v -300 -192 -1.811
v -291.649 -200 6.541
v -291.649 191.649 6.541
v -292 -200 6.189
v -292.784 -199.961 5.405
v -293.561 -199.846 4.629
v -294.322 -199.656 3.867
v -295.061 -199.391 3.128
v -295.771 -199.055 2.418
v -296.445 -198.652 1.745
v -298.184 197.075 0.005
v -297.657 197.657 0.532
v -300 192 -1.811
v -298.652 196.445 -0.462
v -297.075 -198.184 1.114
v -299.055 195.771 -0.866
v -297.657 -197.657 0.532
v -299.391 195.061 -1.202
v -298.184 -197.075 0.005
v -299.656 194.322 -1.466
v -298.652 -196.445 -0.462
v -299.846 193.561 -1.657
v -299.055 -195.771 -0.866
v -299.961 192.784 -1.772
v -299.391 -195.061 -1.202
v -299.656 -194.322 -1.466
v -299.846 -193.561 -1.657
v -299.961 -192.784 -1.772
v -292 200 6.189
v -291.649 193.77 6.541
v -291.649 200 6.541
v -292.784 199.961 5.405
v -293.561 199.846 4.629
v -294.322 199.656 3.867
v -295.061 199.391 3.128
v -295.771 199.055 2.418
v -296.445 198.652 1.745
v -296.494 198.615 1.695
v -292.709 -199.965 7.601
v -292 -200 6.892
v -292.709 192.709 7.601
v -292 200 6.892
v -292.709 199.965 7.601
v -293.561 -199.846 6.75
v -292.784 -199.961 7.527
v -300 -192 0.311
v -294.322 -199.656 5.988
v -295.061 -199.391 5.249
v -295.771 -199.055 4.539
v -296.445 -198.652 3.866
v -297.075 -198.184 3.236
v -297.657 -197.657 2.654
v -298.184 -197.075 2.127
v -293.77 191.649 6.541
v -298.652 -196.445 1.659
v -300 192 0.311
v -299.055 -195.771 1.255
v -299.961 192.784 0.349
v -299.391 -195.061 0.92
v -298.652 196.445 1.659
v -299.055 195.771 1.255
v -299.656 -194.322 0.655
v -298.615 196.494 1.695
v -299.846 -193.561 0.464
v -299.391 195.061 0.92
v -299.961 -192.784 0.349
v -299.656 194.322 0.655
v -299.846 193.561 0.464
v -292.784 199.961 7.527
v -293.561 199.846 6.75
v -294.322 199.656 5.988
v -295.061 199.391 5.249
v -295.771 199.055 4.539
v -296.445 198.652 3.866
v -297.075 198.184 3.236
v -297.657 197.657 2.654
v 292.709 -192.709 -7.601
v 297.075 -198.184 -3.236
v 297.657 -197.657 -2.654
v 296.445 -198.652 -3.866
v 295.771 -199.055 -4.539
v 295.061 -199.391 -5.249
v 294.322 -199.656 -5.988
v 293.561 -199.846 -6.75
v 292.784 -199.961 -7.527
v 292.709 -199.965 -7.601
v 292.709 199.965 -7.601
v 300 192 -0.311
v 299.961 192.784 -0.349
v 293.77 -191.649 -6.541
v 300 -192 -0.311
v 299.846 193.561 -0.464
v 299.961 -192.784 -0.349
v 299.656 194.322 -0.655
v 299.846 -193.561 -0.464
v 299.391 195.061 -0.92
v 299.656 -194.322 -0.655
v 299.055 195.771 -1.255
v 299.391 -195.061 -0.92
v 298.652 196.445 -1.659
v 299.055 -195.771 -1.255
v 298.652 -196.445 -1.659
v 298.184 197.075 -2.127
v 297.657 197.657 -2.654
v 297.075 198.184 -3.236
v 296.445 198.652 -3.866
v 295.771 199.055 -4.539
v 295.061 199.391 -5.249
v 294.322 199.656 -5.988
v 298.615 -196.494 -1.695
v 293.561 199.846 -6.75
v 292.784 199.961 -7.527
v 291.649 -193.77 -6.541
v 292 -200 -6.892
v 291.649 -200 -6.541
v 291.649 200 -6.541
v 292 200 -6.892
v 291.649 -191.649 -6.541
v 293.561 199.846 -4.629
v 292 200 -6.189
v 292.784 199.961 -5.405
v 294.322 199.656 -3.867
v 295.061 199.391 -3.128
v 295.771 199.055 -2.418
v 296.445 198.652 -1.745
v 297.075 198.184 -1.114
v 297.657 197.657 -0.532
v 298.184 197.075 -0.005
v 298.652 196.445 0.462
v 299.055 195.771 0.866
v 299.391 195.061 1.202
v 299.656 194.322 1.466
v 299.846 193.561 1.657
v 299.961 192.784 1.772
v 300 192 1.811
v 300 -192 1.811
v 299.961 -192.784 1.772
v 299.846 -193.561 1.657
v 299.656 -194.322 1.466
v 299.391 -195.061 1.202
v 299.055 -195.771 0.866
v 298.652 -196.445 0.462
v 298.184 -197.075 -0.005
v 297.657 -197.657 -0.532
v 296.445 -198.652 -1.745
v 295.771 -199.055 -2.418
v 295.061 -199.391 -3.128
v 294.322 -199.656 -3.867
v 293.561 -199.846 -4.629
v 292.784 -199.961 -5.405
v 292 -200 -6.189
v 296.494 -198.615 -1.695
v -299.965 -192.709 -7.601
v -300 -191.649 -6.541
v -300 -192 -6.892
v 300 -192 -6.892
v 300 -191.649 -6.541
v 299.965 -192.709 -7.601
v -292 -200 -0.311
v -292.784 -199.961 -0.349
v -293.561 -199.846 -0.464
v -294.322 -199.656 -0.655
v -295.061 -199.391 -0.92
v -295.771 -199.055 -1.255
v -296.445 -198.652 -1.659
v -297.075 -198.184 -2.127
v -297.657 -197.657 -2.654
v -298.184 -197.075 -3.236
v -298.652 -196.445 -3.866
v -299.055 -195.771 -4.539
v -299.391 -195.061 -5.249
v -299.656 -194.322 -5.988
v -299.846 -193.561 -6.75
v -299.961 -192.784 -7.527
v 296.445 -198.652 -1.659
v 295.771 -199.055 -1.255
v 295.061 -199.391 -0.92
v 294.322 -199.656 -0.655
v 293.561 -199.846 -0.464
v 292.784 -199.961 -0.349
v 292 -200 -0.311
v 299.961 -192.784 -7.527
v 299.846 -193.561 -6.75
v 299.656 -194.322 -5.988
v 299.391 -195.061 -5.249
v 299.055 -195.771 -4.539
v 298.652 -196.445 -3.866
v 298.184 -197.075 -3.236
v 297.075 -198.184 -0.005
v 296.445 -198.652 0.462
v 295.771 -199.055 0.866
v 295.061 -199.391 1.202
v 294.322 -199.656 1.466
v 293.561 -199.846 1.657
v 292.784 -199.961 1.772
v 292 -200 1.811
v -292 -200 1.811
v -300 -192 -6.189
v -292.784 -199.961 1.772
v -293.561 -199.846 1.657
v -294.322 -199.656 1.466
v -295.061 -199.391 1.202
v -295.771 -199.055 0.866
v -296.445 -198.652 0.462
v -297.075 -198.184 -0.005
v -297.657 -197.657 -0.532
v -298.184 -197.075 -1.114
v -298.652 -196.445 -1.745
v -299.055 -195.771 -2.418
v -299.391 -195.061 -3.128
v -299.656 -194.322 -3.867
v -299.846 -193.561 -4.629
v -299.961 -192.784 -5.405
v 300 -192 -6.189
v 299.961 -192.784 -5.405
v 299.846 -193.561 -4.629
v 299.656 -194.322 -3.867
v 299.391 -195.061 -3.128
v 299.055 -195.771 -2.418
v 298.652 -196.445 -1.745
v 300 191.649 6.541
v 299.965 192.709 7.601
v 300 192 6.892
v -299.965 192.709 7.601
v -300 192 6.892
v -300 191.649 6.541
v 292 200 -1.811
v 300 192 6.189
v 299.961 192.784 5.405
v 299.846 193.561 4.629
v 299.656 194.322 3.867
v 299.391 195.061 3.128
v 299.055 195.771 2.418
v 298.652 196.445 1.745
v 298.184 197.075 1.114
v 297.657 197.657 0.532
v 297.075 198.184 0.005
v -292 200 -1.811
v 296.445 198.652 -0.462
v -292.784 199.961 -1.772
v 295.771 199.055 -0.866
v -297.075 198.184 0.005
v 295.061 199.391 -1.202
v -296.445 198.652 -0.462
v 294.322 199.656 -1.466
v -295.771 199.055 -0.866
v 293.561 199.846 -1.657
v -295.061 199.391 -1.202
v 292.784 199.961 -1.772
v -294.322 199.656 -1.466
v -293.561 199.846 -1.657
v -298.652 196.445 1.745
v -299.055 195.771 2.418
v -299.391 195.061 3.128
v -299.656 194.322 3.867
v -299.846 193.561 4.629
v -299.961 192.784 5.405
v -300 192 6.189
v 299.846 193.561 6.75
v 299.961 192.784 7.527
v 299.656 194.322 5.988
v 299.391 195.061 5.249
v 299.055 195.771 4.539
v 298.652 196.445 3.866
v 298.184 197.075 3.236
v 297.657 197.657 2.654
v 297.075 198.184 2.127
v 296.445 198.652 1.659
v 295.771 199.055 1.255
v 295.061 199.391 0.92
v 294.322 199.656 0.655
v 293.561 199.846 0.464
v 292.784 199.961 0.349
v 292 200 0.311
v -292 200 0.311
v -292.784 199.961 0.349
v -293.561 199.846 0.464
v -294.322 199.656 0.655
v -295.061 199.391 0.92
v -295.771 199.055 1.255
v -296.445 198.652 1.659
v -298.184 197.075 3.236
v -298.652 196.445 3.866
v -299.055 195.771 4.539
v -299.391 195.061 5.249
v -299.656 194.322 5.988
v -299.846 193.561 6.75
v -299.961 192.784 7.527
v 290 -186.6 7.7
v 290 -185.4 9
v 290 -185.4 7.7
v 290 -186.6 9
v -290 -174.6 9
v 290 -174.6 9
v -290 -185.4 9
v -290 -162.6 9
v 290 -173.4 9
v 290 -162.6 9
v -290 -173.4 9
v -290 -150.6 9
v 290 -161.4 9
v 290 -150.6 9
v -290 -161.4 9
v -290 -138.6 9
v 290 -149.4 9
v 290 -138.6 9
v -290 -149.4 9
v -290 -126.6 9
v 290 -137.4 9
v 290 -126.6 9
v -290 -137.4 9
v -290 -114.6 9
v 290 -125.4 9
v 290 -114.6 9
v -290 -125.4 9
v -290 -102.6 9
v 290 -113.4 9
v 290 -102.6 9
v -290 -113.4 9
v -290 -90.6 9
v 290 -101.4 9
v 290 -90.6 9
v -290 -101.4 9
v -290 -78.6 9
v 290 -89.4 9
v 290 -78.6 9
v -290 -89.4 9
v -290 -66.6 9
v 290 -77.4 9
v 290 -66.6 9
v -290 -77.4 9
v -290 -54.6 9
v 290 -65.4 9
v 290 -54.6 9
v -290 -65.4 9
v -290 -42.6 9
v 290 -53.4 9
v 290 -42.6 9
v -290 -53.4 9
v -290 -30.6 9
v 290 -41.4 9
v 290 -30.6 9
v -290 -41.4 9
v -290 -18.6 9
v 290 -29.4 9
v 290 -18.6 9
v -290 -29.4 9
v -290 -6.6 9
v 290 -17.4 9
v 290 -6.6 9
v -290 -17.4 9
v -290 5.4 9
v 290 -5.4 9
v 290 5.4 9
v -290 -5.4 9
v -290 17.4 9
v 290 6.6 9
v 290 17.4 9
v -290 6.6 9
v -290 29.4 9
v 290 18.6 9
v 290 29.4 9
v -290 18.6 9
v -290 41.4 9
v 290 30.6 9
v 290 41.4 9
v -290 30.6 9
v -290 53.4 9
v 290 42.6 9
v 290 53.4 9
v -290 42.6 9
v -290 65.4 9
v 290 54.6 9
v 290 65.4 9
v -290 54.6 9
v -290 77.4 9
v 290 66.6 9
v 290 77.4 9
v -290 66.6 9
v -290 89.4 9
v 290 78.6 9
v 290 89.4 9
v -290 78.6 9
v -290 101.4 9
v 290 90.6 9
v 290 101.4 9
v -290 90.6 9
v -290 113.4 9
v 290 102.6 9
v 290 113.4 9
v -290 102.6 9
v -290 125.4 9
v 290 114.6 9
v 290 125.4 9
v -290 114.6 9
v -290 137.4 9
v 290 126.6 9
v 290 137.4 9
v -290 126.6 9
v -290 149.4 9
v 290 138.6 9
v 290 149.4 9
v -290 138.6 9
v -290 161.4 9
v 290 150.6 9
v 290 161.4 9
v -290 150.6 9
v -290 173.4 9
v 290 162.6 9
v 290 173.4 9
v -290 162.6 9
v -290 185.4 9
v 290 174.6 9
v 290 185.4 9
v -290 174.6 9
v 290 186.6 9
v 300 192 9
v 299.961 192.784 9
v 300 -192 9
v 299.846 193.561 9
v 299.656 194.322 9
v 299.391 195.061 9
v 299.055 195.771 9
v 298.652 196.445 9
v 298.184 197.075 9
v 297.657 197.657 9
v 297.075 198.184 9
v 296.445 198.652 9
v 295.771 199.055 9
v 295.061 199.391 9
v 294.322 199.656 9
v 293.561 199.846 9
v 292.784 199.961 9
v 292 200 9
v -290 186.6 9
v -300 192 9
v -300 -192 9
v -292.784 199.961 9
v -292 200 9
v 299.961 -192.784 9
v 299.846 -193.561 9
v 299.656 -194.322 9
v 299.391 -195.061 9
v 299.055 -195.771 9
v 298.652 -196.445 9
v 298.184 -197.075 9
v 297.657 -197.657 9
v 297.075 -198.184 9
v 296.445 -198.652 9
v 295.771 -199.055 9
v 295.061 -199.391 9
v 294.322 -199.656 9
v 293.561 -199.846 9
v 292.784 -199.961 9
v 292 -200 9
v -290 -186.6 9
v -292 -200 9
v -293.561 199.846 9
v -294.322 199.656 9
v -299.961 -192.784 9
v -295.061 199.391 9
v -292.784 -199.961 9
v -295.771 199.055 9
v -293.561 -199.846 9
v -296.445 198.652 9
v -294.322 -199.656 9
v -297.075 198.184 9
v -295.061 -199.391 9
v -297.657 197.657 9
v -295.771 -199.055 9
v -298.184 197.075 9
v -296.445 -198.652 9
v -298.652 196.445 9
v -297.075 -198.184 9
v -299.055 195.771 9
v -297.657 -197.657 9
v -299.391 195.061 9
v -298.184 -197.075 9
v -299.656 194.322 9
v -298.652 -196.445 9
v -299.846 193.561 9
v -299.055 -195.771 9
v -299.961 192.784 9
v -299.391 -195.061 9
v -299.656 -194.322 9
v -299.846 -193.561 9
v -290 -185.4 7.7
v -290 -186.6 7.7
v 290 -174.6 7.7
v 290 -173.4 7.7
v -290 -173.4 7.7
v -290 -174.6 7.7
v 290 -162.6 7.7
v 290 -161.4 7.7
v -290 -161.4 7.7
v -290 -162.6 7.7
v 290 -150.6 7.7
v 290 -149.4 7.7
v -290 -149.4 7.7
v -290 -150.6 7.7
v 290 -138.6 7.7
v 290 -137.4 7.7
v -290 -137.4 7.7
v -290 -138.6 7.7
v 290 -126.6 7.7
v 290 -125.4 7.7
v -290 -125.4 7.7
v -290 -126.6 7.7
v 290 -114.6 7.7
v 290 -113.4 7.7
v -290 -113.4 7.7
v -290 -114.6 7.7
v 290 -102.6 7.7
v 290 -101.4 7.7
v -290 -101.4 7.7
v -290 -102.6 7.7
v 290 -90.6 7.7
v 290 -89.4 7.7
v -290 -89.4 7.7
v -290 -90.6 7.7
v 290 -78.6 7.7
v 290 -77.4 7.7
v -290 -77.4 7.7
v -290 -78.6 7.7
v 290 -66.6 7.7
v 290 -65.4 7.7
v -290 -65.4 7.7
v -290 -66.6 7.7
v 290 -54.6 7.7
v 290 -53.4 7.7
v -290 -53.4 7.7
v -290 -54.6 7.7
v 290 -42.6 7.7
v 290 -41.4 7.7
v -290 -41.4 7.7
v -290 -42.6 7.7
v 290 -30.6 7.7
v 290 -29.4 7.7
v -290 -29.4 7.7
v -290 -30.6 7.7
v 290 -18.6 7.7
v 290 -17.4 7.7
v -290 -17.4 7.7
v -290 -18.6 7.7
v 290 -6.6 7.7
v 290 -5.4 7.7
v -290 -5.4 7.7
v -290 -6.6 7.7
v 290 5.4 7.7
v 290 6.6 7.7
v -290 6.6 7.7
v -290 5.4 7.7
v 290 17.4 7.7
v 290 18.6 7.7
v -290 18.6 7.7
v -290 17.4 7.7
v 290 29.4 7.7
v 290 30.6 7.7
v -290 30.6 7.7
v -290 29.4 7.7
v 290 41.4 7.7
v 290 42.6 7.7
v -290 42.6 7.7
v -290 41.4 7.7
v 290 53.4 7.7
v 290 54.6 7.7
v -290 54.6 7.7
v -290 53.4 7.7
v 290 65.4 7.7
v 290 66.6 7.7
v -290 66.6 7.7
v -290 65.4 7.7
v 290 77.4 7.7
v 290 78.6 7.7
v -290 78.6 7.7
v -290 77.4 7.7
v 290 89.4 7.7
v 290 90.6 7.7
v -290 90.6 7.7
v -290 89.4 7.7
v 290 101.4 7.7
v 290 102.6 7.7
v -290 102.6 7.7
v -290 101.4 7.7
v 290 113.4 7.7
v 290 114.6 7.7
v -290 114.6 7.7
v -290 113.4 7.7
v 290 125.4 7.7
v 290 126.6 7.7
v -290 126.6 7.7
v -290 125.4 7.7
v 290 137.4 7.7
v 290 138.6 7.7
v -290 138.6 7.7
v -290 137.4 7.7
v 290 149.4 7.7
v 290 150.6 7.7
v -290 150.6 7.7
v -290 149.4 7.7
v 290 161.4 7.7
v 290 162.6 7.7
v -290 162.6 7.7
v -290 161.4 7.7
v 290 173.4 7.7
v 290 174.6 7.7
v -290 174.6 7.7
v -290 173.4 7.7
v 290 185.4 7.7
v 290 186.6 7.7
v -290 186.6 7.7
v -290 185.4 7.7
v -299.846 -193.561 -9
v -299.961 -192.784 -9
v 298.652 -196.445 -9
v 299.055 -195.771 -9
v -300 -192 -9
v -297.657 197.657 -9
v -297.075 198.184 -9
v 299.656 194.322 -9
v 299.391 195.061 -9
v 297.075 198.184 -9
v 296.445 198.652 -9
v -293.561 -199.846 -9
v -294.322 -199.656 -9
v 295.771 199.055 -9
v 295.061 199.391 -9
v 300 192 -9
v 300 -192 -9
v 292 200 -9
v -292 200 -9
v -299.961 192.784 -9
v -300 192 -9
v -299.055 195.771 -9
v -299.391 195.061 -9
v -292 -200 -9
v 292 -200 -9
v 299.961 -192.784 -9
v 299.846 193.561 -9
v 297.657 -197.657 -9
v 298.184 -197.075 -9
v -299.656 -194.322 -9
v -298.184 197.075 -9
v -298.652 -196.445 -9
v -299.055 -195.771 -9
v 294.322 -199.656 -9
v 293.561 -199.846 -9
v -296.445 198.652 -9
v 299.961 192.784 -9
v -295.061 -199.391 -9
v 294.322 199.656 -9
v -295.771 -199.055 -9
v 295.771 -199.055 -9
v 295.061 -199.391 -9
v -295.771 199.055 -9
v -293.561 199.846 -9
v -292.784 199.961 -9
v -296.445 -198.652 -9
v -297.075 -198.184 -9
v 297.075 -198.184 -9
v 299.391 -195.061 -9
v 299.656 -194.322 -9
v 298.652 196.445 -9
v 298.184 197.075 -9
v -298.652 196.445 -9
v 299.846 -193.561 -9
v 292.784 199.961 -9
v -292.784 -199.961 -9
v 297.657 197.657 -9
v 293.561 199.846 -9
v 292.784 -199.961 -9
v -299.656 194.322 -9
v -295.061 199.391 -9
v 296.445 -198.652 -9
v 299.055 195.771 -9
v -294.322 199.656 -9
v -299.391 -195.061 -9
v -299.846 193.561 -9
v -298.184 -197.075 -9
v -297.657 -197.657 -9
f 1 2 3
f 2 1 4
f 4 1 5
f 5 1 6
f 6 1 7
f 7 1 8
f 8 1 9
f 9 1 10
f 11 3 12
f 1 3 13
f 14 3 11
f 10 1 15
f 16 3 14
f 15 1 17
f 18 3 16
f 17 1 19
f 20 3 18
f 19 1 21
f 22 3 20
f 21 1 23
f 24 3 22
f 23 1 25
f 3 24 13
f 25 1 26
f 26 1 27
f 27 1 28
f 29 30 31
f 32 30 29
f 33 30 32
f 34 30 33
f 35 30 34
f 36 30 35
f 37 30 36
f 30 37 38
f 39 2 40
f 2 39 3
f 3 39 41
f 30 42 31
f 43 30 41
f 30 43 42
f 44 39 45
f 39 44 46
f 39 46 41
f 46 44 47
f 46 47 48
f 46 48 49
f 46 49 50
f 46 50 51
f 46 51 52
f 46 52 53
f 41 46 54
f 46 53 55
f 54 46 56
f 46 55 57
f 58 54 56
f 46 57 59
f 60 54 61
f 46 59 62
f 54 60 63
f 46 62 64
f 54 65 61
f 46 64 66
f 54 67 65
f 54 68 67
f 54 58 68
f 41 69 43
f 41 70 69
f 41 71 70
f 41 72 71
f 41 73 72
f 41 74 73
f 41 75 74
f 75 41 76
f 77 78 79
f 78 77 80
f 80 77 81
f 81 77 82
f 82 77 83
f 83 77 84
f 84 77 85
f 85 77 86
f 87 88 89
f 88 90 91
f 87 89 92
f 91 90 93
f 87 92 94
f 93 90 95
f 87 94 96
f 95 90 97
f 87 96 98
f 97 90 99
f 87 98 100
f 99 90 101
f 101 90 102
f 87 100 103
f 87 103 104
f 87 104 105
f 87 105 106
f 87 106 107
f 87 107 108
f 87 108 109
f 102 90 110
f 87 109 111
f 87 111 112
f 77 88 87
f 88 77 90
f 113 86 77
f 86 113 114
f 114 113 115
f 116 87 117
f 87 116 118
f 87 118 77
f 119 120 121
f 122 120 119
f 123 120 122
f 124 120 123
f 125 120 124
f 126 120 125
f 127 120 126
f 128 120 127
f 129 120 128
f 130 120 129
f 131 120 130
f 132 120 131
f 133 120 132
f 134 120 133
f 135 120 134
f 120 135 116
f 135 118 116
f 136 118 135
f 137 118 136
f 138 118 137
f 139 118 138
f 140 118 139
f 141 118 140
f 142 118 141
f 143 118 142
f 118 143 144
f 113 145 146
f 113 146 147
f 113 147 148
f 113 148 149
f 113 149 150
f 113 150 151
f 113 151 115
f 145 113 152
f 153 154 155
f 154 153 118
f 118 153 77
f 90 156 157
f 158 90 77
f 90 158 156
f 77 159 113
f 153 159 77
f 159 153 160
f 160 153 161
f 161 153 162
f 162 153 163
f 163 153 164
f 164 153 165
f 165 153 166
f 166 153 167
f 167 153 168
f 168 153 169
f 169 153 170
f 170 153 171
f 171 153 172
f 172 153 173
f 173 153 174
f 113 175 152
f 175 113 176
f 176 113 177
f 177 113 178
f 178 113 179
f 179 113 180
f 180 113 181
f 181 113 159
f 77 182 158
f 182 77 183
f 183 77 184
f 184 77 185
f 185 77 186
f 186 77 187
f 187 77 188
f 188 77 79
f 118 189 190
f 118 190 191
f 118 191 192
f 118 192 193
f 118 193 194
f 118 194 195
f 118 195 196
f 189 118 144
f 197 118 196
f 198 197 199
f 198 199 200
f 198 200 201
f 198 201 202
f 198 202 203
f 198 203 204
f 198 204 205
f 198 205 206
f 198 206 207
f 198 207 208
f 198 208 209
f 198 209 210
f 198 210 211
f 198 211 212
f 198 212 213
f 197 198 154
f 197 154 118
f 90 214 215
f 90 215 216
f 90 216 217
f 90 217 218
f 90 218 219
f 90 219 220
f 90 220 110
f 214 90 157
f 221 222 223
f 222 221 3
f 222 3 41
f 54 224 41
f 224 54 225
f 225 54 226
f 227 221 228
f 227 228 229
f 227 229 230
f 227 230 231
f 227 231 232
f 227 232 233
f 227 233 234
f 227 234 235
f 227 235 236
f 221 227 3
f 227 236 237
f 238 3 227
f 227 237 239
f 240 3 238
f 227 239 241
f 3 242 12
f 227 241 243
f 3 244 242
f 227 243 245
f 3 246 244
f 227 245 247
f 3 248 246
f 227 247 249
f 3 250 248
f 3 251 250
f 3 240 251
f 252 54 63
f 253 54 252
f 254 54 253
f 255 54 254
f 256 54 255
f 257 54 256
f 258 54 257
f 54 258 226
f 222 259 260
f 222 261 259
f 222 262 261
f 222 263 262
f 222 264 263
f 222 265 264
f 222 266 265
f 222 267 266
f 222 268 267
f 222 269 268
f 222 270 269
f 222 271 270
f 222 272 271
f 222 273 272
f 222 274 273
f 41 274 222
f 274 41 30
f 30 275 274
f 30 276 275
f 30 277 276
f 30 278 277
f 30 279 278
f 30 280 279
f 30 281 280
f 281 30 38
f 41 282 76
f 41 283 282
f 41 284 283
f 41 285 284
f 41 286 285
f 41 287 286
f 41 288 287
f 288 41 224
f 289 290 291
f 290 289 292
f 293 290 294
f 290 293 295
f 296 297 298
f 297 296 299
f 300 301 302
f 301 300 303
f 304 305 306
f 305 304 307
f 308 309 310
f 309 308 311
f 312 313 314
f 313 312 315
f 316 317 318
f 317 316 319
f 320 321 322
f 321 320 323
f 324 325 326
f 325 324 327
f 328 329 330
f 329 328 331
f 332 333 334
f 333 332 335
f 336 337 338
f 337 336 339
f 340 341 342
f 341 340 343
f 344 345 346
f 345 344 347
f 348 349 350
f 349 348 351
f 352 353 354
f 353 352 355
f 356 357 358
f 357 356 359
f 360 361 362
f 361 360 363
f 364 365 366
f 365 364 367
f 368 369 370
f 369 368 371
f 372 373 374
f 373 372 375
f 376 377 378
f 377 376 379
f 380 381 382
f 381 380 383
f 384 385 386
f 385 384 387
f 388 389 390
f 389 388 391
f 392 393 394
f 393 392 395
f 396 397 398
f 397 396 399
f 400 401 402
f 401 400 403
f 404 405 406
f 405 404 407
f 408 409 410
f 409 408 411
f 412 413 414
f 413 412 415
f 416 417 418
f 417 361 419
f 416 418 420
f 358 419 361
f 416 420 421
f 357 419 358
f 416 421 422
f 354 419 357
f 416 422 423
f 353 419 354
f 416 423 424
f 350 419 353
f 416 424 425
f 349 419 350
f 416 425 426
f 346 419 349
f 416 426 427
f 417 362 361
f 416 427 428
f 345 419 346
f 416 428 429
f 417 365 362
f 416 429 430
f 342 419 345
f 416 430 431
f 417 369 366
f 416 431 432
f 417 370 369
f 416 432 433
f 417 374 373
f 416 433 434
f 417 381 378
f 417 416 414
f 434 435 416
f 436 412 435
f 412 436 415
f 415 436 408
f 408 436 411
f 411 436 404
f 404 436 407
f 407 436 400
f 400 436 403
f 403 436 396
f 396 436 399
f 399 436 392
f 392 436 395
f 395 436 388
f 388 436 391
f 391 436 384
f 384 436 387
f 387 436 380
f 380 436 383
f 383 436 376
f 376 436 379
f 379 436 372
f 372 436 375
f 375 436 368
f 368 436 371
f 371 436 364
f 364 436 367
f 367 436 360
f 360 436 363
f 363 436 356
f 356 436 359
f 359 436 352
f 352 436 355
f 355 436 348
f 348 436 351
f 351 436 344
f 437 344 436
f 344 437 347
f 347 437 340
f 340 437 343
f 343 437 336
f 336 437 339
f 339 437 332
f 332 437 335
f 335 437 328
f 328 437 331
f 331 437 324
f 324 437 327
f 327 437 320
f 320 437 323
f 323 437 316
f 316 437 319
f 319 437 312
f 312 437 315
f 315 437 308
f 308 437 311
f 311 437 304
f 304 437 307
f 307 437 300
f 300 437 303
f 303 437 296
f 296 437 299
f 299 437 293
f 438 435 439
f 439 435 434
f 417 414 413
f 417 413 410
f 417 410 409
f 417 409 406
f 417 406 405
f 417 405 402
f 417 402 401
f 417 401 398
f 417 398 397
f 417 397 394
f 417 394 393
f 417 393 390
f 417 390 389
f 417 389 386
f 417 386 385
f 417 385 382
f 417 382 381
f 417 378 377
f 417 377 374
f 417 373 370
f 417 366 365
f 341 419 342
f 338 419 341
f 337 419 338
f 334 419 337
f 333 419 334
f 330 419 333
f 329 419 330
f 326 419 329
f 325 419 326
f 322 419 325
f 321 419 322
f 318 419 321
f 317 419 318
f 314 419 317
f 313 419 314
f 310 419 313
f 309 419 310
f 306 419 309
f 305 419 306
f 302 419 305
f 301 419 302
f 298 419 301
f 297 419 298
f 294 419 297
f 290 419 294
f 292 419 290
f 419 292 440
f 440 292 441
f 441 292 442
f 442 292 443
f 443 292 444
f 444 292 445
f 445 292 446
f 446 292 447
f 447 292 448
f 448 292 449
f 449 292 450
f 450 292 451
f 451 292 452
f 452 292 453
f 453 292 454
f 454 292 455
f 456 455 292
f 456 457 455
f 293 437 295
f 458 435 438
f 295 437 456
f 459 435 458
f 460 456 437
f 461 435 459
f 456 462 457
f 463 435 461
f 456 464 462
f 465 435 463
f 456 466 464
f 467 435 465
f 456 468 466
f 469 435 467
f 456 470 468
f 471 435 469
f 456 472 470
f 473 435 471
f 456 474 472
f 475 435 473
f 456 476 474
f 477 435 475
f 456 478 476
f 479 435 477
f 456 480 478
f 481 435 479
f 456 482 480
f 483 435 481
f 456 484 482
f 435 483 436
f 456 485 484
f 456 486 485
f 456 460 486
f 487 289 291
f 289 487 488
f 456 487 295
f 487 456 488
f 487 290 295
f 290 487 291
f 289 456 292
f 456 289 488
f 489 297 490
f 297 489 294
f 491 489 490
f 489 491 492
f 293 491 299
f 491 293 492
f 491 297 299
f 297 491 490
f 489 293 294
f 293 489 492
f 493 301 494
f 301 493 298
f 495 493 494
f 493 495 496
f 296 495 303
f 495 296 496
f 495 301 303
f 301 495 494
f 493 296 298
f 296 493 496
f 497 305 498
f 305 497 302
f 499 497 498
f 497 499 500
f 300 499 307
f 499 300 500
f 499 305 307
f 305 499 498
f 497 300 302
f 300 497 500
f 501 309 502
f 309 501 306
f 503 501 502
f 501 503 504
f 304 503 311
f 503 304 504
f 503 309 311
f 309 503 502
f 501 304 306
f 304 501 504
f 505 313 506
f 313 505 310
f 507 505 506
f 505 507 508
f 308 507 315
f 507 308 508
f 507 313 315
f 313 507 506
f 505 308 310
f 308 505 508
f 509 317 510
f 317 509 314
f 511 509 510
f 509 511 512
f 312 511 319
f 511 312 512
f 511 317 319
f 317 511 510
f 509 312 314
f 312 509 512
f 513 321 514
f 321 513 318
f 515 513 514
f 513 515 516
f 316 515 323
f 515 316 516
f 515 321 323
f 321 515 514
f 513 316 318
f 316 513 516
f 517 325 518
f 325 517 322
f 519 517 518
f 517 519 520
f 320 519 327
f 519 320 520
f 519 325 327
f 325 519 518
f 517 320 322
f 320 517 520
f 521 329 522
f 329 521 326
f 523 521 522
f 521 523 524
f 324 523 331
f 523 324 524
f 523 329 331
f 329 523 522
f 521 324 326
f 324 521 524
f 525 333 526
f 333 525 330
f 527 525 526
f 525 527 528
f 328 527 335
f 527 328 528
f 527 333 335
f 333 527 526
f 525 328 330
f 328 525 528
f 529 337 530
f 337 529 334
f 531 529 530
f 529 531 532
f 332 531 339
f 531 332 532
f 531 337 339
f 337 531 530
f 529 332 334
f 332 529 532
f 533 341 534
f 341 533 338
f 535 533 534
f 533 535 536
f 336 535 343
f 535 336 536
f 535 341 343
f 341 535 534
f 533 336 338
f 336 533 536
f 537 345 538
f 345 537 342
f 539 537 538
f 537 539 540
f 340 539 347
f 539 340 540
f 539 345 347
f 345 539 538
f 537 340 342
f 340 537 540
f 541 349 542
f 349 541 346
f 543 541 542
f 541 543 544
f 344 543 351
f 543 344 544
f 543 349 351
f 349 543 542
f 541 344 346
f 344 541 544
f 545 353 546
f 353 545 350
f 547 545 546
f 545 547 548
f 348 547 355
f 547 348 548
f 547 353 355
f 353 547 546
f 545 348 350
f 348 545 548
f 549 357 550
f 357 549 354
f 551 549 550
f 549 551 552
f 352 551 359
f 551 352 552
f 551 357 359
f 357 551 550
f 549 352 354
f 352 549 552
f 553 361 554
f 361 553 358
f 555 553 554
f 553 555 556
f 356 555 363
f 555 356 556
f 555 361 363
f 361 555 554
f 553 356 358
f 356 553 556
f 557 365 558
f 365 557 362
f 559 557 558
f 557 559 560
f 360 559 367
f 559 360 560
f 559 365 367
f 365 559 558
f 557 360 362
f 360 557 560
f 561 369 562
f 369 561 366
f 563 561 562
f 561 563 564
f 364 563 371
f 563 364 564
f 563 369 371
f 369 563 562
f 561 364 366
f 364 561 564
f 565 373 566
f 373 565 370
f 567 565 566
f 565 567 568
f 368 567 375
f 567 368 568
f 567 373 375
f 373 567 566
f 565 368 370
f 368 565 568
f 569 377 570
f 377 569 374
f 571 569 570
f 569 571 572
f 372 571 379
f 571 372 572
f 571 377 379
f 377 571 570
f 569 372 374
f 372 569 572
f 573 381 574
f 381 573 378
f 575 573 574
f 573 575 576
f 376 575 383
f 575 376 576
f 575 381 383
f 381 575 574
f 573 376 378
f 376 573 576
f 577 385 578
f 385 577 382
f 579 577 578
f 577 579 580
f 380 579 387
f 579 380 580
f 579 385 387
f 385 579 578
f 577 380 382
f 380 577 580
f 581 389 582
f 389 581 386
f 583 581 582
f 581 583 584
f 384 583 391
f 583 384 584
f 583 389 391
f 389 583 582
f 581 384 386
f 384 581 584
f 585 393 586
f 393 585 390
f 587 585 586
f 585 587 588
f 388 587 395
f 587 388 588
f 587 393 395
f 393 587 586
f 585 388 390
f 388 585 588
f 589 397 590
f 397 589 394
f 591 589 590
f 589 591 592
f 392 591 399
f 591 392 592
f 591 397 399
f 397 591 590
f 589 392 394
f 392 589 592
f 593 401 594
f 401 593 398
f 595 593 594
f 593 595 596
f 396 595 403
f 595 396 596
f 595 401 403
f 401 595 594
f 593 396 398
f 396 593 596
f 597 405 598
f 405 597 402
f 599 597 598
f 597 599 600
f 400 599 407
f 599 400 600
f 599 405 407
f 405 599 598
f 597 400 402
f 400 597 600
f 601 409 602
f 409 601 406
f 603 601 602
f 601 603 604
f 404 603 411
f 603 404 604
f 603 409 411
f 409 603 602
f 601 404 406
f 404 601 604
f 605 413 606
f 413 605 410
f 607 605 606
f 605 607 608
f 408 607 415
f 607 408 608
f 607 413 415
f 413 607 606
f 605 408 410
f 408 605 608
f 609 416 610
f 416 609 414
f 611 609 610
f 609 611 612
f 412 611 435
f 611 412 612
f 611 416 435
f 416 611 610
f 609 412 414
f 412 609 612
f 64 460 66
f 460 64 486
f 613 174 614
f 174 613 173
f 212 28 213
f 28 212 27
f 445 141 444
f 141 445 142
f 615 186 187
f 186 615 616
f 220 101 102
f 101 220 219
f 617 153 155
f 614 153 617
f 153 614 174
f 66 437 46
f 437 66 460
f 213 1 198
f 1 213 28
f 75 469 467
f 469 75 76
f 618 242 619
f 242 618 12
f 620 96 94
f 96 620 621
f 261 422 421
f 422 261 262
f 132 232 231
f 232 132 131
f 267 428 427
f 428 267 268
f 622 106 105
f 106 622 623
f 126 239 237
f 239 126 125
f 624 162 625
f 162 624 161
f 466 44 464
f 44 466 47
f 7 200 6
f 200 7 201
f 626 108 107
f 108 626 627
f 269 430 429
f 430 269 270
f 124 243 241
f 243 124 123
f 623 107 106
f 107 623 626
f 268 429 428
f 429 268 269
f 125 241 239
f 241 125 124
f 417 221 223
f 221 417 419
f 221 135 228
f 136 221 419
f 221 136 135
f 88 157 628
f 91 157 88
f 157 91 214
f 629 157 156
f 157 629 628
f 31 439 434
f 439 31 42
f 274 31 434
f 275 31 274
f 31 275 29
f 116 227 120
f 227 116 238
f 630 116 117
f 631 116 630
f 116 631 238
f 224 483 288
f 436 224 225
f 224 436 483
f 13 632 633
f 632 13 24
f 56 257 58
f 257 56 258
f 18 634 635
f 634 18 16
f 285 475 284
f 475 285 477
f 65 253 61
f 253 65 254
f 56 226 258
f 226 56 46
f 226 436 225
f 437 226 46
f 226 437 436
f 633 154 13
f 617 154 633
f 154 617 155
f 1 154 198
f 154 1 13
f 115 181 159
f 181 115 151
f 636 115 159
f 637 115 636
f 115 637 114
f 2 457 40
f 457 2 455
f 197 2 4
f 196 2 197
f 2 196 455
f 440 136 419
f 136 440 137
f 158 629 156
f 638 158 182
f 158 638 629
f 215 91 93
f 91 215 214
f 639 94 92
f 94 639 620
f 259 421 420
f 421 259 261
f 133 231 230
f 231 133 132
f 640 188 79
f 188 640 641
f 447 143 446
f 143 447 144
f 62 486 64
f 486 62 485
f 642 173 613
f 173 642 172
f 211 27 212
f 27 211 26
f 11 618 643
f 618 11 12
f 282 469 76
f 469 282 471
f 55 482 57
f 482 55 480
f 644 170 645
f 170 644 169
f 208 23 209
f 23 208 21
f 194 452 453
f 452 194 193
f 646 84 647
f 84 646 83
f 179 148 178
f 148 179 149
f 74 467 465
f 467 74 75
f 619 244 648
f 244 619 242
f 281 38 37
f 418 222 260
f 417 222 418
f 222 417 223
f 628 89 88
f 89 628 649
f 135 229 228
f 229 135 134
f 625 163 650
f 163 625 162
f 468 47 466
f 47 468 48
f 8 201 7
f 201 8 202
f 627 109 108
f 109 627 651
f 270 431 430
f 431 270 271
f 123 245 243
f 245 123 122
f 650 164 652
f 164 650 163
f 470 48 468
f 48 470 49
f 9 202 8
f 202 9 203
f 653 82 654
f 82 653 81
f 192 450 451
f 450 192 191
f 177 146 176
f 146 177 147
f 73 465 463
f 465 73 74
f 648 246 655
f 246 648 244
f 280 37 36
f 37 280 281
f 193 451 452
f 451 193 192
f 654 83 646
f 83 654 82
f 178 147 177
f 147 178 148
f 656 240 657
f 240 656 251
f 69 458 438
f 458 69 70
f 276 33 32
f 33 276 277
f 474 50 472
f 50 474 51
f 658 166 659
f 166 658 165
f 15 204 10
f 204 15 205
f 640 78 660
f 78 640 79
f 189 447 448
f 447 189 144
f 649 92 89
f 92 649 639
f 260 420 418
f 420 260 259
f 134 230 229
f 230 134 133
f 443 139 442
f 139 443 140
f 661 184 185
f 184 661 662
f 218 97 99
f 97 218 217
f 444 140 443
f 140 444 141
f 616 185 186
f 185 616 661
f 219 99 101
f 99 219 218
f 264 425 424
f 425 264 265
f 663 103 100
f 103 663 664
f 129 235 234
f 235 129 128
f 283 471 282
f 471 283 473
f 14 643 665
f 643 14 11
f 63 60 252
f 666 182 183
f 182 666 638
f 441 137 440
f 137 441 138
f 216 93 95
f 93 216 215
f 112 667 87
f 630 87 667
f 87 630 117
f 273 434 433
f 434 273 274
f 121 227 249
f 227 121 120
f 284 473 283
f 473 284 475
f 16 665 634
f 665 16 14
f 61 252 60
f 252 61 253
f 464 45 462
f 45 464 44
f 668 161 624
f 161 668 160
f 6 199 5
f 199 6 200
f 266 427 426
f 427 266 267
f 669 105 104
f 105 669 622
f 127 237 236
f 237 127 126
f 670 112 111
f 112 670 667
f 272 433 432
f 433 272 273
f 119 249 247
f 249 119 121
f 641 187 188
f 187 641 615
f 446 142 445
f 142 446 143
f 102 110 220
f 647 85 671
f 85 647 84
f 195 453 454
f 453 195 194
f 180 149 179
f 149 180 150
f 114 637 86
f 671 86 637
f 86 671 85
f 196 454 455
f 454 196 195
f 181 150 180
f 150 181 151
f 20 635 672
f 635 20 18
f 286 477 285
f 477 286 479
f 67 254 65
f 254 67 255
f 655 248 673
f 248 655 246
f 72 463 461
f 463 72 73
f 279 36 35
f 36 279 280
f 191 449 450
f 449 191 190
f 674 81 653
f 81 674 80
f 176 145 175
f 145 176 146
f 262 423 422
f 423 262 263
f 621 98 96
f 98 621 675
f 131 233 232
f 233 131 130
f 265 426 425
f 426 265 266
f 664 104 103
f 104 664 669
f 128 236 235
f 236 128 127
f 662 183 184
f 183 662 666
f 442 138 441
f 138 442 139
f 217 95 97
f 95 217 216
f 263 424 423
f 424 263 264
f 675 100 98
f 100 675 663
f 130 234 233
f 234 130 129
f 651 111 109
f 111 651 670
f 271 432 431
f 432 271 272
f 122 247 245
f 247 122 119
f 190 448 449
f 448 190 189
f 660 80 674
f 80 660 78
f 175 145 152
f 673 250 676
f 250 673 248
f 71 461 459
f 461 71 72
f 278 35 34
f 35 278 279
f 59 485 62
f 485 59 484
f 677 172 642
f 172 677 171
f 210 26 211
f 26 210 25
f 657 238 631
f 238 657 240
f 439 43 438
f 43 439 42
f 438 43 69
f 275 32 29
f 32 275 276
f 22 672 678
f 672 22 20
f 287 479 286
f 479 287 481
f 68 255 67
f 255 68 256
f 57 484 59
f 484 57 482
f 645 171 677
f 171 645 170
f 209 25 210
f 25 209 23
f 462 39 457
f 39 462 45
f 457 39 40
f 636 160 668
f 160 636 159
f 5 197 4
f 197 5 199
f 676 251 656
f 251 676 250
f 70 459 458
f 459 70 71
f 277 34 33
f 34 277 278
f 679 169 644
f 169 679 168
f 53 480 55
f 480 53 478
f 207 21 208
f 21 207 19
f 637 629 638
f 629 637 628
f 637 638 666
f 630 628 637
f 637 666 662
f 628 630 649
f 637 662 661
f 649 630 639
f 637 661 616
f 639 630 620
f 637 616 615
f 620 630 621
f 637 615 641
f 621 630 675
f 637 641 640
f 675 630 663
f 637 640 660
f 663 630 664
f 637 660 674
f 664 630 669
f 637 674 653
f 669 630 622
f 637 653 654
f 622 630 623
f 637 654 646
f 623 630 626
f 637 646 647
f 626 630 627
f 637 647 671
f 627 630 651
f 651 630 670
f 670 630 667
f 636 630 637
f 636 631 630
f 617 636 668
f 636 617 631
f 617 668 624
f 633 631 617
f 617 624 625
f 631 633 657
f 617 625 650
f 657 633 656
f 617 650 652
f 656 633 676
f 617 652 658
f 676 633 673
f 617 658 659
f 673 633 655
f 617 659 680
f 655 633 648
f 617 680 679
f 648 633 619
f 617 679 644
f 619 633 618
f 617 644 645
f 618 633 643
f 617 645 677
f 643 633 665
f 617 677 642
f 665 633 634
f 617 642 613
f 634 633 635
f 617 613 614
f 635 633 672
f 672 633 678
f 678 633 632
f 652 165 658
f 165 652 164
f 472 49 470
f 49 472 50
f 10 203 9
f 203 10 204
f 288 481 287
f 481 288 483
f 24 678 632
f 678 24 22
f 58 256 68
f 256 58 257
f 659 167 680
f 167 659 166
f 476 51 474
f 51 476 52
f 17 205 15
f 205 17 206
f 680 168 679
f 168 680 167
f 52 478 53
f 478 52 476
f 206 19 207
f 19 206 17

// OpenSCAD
// Parameters
sheet_L = 600; //[300:1200:1]
sheet_W = 400; //[200:800:1]
sheet_T = 18;  //[9:36:1]
corner_R = 8;  //[2:20:1]
chamfer_C = 1.5; //[0.5:4:0.5]
texture_depth = 0.3; //[0.1:1:0.1]
texture_pitch = 12; //[6:30:1]
texture_groove_W = 1.2; //[0.6:3:0.1]
texture_margin = 10; //[5:30:1]
overlap = 1; //[0.5:2:0.5]

$fn = 64;

// Base
module mdf_sheet_panel() {
    cube([sheet_L, sheet_W, sheet_T], center=true);
}

// Rounded-rectangle outline (2D), then extrude to thickness
module rounded_rect_2d(L, W, R) {
    R2 = min(R, min(L, W)/2);
    hull() {
        for (sx = [-1, 1], sy = [-1, 1])
            translate([sx*(L/2 - R2), sy*(W/2 - R2)])
                circle(r=R2);
    }
}

// Chamfer cutters (remove material along edges)
module chamfer_cutters() {
    // Long edges (along Y), cutters placed at +/-X faces
    for (sx = [-1, 1])
        translate([sx*(sheet_L/2 - chamfer_C/2), 0, 0])
            rotate([0, 45, 0])
                cube([chamfer_C, sheet_W + 2*overlap, sheet_T + 2*overlap], center=true);

    // Short edges (along X), cutters placed at +/-Y faces
    for (sy = [-1, 1])
        translate([0, sy*(sheet_W/2 - chamfer_C/2), 0])
            rotate([45, 0, 0])
                cube([sheet_L + 2*overlap, chamfer_C, sheet_T + 2*overlap], center=true);
}

// Surface texture grooves (subtractive), repeated across width
module surface_texture_grain() {
    zpos = sheet_T/2 - (texture_depth + overlap)/2; // slightly into top face
    usable_W = sheet_W - 2*texture_margin;
    n = floor(usable_W / texture_pitch);
    for (i = [-n/2 : n/2]) {
        y = i * texture_pitch;
        if (abs(y) <= usable_W/2 + 1e-6)
            translate([0, y, zpos])
                cube([sheet_L - 2*texture_margin, texture_groove_W, texture_depth + overlap], center=true);
    }
}

// Final Output: one connected solid
difference() {
    // Main sheet with rounded corners
    linear_extrude(height=sheet_T, center=true)
        rounded_rect_2d(sheet_L, sheet_W, corner_R);

    // Edge chamfers
    chamfer_cutters();

    // Top surface grain
    surface_texture_grain();
}
